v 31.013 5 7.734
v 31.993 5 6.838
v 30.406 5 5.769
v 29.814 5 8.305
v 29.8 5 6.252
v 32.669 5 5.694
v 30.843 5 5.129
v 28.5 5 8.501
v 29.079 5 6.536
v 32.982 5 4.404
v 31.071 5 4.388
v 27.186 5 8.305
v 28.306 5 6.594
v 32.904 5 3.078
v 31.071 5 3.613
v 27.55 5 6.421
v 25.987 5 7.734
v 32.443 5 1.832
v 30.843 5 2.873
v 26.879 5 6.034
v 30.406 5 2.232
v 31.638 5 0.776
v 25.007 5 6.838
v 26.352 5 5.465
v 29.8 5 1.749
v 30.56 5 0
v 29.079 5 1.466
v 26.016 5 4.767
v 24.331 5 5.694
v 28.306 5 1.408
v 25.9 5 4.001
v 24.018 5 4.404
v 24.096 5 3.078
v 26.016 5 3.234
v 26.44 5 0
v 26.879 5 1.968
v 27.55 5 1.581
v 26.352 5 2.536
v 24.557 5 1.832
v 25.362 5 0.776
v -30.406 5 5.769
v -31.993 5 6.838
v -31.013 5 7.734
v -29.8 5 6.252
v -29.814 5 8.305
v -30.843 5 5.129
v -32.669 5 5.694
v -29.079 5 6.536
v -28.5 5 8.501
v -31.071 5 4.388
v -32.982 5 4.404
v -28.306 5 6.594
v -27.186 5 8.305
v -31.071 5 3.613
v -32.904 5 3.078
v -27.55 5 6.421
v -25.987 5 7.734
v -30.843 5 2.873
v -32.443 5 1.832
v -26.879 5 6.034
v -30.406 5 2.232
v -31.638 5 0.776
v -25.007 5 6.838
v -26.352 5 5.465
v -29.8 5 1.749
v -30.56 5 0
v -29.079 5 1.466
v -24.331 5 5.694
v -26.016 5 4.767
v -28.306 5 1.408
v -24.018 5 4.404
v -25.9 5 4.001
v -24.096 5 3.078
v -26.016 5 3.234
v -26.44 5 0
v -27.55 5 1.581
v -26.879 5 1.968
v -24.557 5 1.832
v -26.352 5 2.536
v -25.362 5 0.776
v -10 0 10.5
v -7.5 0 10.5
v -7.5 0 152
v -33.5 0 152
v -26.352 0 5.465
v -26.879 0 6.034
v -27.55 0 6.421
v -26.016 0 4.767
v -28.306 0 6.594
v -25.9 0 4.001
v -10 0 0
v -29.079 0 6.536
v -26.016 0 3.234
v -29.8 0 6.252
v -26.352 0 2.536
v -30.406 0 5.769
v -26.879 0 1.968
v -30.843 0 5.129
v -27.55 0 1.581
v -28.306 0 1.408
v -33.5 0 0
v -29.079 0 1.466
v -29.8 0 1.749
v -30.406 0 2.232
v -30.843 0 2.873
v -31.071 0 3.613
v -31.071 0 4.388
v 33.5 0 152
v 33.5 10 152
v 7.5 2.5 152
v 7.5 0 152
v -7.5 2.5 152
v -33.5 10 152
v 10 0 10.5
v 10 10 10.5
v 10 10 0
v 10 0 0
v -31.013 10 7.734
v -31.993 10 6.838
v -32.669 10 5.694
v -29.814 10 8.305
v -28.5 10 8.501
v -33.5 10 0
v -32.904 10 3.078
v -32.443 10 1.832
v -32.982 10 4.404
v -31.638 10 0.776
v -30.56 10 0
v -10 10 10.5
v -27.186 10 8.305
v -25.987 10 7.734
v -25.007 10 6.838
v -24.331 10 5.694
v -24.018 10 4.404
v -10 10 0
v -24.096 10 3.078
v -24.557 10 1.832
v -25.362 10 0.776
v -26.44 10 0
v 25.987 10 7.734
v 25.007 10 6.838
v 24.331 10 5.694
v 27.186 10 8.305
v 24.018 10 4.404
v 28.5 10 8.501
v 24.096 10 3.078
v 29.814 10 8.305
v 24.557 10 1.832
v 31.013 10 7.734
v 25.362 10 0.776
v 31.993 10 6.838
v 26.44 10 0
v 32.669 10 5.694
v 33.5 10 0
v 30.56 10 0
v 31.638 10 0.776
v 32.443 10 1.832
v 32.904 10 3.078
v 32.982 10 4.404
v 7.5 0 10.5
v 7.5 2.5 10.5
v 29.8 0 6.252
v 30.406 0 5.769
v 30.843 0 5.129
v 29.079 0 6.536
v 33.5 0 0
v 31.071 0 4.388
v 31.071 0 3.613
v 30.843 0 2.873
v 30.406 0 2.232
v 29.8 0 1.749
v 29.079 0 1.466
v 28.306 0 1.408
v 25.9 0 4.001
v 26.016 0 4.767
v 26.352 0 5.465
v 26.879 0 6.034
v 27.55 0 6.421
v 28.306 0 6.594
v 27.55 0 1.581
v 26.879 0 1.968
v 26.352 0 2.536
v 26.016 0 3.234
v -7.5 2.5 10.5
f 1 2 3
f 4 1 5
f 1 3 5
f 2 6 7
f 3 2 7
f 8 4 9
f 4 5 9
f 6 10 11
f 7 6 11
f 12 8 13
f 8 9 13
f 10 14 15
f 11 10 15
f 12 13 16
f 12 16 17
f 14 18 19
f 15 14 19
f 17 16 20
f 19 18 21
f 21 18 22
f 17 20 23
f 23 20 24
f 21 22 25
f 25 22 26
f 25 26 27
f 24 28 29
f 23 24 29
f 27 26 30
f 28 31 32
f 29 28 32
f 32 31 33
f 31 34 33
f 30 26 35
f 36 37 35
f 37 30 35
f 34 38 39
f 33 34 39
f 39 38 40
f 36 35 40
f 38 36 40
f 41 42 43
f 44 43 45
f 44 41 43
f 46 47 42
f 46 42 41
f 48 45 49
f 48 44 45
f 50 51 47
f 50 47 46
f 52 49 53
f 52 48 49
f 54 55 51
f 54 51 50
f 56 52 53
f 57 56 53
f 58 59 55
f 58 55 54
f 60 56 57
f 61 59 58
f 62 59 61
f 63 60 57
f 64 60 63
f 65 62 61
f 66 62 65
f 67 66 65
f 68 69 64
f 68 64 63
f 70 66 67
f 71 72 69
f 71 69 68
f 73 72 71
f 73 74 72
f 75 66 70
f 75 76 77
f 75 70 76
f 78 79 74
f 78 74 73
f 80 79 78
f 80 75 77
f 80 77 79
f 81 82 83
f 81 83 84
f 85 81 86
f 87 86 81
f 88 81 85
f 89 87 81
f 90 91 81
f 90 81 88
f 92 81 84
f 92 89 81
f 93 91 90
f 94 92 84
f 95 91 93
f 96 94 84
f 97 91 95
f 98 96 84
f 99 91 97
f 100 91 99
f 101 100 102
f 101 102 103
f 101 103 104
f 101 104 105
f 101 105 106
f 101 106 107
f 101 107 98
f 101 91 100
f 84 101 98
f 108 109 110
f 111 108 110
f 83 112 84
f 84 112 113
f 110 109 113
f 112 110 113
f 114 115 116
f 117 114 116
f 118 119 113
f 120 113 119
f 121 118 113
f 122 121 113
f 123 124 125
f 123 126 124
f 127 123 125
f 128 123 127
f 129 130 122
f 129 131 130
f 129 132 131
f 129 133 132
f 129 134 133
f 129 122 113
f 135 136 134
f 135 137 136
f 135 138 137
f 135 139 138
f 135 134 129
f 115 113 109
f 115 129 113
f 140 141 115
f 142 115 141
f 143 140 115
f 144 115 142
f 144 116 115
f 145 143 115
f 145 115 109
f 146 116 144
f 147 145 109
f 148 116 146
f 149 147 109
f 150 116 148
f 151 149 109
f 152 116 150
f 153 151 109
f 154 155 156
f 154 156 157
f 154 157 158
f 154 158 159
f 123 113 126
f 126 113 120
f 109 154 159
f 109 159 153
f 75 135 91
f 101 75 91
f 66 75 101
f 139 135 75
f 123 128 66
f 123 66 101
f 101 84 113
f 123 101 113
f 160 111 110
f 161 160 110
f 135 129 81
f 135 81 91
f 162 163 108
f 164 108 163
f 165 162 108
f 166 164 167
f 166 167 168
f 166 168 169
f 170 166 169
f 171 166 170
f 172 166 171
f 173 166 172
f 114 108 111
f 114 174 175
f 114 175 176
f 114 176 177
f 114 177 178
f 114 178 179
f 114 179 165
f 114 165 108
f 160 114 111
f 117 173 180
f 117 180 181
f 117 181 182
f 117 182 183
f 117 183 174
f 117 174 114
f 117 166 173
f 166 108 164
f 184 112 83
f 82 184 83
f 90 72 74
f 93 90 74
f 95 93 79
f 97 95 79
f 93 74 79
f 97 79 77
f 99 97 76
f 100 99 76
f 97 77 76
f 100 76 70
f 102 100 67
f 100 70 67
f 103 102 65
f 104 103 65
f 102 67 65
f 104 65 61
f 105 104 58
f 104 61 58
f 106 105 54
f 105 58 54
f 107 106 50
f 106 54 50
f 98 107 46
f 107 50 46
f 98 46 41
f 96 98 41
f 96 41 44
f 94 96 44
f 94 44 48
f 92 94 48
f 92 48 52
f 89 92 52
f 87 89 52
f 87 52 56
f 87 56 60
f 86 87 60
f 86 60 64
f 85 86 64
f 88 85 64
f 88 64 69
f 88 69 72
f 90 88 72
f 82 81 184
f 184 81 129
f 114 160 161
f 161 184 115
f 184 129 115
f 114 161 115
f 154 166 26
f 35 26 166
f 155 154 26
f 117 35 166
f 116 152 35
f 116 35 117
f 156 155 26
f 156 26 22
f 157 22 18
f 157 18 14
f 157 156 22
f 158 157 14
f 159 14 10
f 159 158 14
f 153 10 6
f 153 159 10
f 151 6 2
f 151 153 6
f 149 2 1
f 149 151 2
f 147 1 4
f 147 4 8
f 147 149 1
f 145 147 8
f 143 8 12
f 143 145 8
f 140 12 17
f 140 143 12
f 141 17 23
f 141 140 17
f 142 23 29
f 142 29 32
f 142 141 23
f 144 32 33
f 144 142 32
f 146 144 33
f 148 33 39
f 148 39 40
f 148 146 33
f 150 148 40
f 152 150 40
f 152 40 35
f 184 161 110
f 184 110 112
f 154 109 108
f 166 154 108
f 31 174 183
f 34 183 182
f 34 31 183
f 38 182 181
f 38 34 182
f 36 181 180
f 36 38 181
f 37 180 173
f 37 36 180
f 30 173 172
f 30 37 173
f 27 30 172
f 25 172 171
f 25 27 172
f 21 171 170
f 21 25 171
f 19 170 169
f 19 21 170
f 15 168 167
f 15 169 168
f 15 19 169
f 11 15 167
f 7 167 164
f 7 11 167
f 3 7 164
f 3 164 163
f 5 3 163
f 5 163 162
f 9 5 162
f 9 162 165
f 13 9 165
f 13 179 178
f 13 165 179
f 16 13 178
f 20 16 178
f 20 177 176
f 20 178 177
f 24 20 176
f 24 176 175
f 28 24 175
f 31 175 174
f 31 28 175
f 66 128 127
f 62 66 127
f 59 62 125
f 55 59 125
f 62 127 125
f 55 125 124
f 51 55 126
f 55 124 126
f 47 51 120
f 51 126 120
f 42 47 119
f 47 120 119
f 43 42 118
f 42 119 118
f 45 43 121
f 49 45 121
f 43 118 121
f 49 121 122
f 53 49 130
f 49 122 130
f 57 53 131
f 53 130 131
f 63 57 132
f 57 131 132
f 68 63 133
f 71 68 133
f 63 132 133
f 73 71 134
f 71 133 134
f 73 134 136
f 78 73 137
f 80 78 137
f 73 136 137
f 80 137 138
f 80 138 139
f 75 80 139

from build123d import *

# Parameters (mm, degrees)
BOSS_EXTRUDE1_DEPTH = 152
SKETCH2_W           = 20
SKETCH2_H           = 10.5
CUT_EXTRUDE1_DEPTH  = 11
CUT_EXTRUDE2_DEPTH  = 5
SKETCH7_R           = 2.6
CUT_EXTRUDE3_DEPTH  = 6


with BuildPart() as part:
    # Sketch1 → Boss-Extrude1 (new body)
    with BuildSketch(Plane.XY):
        Polygon((-33.5, 0), (-33.5, 10), (33.5, 10), (33.5, 0), (7.5, 0), (7.5, 2.5), (-7.5, 2.5), (-7.5, 0), align=None)
    extrude(amount=BOSS_EXTRUDE1_DEPTH)

    # Sketch2 → Cut-Extrude1 (cut, through all)
    with BuildSketch(Plane(origin=(0, 10, 0), x_dir=(1, 0, 0), z_dir=(0, 1, 0))):
        with Locations((0, -5.25)):
            Rectangle(SKETCH2_W, SKETCH2_H)
    extrude(amount=-CUT_EXTRUDE1_DEPTH, mode=Mode.SUBTRACT)

    # Sketch6 → Cut-Extrude2 (cut)
    with BuildSketch(Plane(origin=(0, 10, 0), x_dir=(1, 0, 0), z_dir=(0, 1, 0))):
        with BuildLine():
            Line((-26.44, 0), (-30.56, 0))
            ThreePointArc((-30.56, 0), (-28.5, -8.50079992), (-26.44, 0))
        make_face()
    cut_extrude2 = extrude(amount=-CUT_EXTRUDE2_DEPTH, mode=Mode.SUBTRACT)

    # Sketch7 → Cut-Extrude3 (cut, through all)
    with BuildSketch(Plane(origin=(0, 5, 0), x_dir=(1, 0, 0), z_dir=(0, 1, 0))):
        with Locations((-28.5, -4.00079992)):
            Circle(SKETCH7_R)
    cut_extrude3 = extrude(amount=-CUT_EXTRUDE3_DEPTH, mode=Mode.SUBTRACT)

    # Mirror1: Cut-Extrude2, Cut-Extrude3 across plane
    add(cut_extrude2.mirror(Plane(origin=(0, 0, 0), x_dir=(0, 0, 1), z_dir=(1, 0, 0))), mode=Mode.SUBTRACT)
    add(cut_extrude3.mirror(Plane(origin=(0, 0, 0), x_dir=(0, 0, 1), z_dir=(1, 0, 0))), mode=Mode.SUBTRACT)


solid = part.part
